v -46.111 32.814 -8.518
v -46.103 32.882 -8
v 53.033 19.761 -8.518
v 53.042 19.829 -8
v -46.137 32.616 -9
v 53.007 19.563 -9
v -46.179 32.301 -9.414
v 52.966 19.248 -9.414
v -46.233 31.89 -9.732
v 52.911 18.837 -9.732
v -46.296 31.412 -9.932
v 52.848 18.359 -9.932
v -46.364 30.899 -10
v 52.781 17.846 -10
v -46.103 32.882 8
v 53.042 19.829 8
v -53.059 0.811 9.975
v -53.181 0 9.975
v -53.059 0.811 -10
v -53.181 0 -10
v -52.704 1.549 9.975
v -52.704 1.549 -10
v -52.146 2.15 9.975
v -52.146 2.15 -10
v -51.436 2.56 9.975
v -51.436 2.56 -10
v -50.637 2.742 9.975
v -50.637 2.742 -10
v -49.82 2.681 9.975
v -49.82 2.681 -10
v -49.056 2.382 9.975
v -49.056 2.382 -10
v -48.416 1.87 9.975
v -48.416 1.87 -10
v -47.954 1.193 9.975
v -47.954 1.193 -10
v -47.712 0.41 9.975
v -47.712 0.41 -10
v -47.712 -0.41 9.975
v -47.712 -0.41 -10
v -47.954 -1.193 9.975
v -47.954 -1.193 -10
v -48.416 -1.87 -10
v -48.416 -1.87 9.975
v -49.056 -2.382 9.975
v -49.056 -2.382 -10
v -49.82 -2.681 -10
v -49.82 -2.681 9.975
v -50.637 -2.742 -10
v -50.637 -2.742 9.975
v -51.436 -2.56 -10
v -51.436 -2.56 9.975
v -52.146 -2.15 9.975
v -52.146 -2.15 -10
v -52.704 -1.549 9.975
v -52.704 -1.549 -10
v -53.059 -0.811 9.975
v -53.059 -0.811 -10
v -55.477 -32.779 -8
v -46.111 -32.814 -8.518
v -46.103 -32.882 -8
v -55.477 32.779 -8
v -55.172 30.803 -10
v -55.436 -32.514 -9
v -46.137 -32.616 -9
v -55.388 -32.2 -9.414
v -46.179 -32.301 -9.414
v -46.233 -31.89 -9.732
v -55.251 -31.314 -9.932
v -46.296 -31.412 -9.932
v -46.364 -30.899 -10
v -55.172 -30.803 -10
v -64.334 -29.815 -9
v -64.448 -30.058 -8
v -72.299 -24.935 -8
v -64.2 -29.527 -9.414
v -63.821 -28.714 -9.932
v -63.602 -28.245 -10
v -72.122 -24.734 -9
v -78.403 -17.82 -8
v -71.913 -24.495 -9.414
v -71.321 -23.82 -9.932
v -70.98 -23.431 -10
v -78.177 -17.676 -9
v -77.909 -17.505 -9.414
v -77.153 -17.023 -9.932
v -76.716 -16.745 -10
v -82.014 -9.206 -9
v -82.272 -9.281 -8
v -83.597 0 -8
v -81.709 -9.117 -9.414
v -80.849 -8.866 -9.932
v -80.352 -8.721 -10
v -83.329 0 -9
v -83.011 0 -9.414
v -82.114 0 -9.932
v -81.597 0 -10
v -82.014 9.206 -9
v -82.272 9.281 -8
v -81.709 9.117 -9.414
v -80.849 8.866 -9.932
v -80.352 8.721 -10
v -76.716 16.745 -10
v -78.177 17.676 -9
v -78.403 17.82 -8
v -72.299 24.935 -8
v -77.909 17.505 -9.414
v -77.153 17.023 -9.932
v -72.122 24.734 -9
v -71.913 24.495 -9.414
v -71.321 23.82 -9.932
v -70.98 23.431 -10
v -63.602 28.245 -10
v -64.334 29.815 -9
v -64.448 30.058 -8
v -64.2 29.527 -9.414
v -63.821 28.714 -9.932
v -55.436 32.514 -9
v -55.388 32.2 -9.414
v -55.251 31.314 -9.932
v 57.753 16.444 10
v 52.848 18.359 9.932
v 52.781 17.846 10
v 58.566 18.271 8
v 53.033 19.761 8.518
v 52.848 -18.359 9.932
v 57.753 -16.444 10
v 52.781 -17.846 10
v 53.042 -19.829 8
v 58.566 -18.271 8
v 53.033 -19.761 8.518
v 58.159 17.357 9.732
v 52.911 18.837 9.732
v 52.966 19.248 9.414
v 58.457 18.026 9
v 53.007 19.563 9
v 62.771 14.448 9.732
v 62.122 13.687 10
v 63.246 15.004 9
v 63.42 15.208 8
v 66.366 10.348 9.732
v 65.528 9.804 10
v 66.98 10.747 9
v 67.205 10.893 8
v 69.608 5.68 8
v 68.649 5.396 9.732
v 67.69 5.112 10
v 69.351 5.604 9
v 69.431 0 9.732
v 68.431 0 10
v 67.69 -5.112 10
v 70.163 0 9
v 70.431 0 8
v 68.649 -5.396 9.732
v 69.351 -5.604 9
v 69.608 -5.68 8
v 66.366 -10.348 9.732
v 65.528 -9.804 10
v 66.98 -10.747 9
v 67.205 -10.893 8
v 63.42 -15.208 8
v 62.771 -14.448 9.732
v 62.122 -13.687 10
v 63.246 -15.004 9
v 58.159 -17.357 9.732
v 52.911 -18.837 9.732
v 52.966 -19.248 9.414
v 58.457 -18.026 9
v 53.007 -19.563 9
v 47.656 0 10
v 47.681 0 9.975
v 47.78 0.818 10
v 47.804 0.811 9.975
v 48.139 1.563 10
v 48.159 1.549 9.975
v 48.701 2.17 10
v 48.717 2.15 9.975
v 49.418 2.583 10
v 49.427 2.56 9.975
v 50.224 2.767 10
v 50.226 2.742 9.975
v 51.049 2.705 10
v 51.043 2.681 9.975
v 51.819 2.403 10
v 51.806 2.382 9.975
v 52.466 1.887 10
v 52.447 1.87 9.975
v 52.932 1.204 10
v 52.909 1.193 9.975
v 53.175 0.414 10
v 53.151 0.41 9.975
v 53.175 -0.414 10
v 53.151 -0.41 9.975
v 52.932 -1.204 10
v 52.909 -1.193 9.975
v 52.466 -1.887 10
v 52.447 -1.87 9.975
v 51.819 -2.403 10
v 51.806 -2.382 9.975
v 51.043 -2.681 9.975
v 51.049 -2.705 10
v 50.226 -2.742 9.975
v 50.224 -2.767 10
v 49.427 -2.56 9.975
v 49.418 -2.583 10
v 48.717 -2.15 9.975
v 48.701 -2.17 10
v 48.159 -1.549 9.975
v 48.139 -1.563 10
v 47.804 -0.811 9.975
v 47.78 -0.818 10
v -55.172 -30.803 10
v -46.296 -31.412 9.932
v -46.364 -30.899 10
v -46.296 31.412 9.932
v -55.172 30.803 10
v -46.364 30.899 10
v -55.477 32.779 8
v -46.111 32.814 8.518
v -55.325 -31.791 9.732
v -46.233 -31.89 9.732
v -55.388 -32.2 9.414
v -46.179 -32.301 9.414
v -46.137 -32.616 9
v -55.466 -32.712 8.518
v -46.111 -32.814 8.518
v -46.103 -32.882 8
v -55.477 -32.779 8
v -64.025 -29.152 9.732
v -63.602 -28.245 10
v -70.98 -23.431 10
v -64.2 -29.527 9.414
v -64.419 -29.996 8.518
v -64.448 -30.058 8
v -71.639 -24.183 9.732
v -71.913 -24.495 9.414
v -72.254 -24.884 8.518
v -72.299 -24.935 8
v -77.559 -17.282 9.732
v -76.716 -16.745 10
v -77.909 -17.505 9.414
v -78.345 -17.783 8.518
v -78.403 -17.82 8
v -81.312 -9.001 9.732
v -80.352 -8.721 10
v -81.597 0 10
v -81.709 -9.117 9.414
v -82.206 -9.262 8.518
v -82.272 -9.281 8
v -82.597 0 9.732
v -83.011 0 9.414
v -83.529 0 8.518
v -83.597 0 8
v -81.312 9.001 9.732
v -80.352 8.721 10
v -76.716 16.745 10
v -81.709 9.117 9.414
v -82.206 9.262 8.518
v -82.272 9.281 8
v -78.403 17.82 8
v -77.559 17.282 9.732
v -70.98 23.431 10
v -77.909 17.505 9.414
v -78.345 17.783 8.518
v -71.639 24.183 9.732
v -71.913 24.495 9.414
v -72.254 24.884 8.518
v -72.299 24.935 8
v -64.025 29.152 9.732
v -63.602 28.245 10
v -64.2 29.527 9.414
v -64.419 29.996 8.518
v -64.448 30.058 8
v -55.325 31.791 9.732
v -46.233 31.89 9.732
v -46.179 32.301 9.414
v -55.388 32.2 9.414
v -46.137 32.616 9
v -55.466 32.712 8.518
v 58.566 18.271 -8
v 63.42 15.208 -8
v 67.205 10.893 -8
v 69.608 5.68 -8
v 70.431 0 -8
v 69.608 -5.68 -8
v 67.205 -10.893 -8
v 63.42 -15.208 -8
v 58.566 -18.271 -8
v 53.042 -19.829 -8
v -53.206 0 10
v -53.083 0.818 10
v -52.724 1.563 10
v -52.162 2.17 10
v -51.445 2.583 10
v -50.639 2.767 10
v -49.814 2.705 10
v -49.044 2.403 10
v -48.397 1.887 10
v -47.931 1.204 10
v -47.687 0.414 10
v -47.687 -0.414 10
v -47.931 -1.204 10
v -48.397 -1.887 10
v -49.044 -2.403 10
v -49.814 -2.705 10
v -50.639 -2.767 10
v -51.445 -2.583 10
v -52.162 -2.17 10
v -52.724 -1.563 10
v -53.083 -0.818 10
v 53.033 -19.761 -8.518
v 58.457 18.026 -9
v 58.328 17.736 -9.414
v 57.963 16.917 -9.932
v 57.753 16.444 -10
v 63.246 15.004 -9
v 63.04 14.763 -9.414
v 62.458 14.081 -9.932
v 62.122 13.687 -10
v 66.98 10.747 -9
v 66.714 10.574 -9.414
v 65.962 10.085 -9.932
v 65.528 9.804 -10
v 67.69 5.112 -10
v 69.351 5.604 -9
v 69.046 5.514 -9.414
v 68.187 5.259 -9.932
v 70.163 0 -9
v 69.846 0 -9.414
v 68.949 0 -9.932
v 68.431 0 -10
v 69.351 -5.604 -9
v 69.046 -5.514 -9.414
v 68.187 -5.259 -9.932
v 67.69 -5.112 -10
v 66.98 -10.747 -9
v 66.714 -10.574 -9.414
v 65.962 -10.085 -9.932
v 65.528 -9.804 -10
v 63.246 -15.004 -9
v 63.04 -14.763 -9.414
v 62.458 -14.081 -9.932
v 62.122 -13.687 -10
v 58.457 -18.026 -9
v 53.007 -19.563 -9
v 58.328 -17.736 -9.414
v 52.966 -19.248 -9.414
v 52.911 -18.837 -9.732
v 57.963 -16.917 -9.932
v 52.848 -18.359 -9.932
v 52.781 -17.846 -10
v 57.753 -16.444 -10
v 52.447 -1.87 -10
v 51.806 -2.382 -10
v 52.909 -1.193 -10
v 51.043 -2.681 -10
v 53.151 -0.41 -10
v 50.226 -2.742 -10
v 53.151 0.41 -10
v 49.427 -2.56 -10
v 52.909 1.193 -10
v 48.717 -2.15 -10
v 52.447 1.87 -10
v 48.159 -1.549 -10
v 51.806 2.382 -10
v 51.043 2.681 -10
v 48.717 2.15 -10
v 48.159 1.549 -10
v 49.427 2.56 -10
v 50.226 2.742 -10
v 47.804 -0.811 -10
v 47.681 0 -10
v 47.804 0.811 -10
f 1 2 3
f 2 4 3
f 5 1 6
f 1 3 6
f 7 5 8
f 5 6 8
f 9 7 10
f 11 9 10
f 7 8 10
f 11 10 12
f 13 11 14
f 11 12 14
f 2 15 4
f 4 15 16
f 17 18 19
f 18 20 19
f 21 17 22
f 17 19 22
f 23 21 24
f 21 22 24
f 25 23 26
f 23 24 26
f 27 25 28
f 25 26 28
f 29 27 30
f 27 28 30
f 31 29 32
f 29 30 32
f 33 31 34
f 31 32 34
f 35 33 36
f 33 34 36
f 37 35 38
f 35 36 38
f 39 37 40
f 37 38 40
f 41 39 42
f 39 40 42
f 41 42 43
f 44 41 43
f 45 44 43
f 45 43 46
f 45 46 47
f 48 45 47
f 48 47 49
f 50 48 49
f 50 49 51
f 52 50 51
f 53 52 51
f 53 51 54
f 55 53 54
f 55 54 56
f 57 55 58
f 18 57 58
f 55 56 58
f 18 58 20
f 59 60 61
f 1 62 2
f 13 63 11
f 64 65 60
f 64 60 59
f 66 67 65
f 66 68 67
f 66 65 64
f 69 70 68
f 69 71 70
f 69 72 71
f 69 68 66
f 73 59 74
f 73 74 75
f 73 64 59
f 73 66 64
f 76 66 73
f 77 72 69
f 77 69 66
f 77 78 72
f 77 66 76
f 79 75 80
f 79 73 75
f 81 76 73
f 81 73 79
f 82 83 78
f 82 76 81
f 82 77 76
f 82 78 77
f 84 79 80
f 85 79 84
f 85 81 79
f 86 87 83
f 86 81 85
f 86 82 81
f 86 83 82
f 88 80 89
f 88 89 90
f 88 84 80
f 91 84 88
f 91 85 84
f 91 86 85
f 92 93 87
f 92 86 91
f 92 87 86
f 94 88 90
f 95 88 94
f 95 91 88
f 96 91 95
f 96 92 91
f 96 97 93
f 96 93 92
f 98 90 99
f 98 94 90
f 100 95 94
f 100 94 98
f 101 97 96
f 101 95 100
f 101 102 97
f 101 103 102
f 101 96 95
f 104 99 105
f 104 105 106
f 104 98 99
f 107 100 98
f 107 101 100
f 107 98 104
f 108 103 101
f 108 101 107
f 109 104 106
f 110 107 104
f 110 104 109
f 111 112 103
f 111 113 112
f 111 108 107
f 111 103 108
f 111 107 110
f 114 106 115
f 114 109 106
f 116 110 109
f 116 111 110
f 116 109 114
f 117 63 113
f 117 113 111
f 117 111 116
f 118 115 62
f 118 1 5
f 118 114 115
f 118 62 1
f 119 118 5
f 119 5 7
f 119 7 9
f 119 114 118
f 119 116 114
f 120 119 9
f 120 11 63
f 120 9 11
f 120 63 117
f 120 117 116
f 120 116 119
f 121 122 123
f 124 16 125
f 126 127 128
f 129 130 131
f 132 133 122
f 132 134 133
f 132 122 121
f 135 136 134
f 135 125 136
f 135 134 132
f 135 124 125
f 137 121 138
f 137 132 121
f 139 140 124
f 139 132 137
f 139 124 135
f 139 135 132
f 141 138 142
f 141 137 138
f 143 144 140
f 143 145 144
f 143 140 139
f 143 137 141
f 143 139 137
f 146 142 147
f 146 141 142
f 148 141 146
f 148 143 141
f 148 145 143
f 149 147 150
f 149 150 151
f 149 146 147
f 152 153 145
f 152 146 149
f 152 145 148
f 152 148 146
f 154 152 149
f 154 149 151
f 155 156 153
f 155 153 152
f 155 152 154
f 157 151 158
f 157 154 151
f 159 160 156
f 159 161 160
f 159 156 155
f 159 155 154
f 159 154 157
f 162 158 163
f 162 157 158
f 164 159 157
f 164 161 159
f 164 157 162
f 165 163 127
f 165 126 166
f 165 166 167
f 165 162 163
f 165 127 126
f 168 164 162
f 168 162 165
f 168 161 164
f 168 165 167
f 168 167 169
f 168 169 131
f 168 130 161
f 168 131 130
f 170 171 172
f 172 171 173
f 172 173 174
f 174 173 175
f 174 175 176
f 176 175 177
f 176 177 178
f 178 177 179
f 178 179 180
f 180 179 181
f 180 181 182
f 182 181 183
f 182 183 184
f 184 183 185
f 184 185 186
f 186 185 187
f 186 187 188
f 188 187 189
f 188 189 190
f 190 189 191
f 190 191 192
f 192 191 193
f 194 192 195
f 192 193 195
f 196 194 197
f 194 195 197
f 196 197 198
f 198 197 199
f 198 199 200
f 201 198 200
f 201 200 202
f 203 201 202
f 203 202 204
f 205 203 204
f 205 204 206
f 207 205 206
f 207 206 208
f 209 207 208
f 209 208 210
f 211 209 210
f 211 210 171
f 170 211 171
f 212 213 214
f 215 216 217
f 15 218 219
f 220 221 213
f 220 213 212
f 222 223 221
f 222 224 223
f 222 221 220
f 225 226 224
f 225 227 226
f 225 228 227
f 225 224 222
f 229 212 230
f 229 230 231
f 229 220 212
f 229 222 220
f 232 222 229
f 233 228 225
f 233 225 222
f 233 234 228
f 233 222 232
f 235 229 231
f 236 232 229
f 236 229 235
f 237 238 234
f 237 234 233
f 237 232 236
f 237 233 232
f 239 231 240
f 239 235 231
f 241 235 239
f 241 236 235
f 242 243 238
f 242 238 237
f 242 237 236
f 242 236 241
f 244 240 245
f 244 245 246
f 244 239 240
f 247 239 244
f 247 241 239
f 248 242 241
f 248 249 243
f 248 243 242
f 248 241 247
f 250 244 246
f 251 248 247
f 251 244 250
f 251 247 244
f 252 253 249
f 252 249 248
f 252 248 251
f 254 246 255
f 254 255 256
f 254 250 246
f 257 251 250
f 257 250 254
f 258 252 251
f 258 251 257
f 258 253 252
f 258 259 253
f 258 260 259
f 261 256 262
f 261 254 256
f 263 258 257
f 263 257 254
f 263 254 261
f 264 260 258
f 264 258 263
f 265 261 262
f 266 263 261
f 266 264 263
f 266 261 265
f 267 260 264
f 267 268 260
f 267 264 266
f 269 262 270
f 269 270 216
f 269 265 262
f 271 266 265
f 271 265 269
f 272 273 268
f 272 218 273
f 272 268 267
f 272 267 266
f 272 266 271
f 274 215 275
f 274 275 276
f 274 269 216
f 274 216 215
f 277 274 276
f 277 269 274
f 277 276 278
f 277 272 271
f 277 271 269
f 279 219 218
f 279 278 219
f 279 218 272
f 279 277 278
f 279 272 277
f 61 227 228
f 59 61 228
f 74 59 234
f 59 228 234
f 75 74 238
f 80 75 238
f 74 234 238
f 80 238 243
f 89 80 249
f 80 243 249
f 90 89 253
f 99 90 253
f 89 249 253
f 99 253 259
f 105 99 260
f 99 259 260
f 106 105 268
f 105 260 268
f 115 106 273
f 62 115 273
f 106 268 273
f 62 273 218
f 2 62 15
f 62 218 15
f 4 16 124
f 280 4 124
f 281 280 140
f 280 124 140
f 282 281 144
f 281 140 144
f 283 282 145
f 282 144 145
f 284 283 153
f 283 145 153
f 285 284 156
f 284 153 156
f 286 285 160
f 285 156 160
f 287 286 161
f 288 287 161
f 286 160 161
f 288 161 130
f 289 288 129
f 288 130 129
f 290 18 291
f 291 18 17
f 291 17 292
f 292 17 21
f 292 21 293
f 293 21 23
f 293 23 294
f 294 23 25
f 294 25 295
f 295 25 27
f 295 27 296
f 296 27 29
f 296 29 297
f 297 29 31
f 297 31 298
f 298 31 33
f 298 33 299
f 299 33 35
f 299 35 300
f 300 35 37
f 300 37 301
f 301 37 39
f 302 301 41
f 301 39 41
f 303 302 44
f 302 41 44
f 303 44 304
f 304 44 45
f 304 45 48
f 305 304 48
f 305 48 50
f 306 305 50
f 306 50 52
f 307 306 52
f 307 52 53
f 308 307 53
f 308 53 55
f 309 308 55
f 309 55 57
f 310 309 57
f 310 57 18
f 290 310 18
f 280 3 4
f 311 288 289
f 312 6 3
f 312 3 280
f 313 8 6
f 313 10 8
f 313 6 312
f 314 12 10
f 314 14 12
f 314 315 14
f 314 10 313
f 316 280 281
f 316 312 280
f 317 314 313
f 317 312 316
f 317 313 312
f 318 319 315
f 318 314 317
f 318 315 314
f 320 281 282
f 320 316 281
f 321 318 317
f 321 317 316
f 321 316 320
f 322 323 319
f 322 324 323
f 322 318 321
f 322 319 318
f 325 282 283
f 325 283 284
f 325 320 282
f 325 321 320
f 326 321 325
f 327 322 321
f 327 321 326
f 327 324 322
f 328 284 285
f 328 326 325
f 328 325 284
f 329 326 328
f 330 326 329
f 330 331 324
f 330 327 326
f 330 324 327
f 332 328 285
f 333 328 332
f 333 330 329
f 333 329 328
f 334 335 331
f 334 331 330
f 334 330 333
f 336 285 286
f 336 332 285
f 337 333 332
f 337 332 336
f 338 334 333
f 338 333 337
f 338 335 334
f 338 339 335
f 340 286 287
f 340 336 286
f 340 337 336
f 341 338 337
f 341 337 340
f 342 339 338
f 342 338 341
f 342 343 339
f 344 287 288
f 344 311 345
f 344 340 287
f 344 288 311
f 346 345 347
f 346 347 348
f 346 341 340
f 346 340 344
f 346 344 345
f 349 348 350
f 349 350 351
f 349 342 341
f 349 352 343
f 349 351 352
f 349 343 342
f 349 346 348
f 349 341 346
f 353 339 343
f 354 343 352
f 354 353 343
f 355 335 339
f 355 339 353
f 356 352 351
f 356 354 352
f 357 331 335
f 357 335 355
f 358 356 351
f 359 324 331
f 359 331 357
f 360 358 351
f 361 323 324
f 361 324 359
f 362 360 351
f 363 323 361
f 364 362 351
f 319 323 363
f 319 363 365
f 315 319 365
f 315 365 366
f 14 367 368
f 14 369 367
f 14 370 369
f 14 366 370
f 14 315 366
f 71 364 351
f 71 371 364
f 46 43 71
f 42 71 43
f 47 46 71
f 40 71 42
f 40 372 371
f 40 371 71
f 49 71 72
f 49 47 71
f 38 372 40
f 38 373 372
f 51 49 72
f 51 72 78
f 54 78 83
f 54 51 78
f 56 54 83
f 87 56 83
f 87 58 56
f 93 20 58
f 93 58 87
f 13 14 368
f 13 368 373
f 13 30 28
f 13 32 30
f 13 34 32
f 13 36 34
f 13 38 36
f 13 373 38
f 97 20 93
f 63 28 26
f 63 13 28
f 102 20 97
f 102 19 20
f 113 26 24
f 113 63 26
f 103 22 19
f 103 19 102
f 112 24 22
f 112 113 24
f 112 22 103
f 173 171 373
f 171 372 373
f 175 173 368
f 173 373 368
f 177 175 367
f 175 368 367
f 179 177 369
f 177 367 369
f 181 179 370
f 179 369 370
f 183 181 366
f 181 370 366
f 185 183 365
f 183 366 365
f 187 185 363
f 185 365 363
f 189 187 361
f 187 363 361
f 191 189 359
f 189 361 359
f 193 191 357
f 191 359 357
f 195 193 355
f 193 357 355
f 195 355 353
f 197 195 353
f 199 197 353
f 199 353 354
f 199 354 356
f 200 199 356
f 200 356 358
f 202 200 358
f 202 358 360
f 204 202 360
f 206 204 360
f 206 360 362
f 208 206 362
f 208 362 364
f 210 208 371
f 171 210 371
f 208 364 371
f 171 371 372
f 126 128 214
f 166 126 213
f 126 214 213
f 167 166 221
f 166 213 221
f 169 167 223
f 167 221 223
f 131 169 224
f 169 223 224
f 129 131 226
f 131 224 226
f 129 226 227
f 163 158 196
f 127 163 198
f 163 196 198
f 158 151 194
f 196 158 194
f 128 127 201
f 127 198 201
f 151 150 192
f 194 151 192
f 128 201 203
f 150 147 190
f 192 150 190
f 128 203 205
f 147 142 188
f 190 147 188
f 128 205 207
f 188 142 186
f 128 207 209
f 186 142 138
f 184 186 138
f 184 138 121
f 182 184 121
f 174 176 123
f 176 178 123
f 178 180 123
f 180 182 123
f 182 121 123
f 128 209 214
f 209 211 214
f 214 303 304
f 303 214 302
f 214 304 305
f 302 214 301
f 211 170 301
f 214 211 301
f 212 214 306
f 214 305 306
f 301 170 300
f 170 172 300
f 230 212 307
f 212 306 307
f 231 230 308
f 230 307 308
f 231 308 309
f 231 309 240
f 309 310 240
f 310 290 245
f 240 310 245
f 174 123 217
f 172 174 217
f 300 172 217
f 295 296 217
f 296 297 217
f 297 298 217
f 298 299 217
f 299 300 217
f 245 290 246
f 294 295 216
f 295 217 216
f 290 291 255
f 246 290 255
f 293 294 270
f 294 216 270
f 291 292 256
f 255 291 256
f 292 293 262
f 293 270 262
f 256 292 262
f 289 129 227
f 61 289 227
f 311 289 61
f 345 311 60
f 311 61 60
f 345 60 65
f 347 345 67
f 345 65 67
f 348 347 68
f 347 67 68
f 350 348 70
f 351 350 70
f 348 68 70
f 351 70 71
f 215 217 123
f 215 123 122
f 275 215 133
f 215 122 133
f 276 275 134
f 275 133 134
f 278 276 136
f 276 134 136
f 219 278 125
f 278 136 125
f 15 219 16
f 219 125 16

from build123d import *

# Parameters (mm, degrees)
BRAS_DEPTH              = 10
PER_AGE_M51_D           = 5.5
PER_AGE_M51_CSINK_D     = 5.55
PER_AGE_M51_CSINK_ANGLE = 90
CONG_1_R                = 2


with BuildPart() as part:
    # Profil Bras → Bras (new, symmetric)
    with BuildSketch(Plane.XY):
        with BuildLine():
            Line((-46.102514264, 32.881516449), (53.041971873, 19.828897227))
            ThreePointArc((53.041971873, 19.828897227), (70.431448029, 0), (53.041971873, -19.828897227))
            Line((53.041971873, -19.828897227), (-46.102514264, -32.881516449))
            ThreePointArc((-46.102514264, -32.881516449), (-83.596697788, 0), (-46.102514264, 32.881516449))
        make_face()
    extrude(amount=BRAS_DEPTH, both=True)

    # Perçage M51 (through all)
    with Locations(Plane.XY.offset(10)):
        with Locations((-50.431448029, 0), (50.431448029, 0)):
            CounterSinkHole(PER_AGE_M51_D / 2, PER_AGE_M51_CSINK_D / 2, counter_sink_angle=PER_AGE_M51_CSINK_ANGLE)

    # Congé1
    cong_1_edges = [part.edges().sort_by_distance(p)[0] for p in [
        (70.431448029, 0, 10),
        (3.469728805, 26.355206838, 10),
        (-83.596697788, 0, 10),
        (3.469728805, 26.355206838, -10),
        (70.431448029, 0, -10),
        (3.469728805, -26.355206838, -10),
        (-83.596697788, 0, -10),
        (3.469728805, -26.355206838, 10),
    ]]
    fillet(cong_1_edges, radius=CONG_1_R)


solid = part.part
